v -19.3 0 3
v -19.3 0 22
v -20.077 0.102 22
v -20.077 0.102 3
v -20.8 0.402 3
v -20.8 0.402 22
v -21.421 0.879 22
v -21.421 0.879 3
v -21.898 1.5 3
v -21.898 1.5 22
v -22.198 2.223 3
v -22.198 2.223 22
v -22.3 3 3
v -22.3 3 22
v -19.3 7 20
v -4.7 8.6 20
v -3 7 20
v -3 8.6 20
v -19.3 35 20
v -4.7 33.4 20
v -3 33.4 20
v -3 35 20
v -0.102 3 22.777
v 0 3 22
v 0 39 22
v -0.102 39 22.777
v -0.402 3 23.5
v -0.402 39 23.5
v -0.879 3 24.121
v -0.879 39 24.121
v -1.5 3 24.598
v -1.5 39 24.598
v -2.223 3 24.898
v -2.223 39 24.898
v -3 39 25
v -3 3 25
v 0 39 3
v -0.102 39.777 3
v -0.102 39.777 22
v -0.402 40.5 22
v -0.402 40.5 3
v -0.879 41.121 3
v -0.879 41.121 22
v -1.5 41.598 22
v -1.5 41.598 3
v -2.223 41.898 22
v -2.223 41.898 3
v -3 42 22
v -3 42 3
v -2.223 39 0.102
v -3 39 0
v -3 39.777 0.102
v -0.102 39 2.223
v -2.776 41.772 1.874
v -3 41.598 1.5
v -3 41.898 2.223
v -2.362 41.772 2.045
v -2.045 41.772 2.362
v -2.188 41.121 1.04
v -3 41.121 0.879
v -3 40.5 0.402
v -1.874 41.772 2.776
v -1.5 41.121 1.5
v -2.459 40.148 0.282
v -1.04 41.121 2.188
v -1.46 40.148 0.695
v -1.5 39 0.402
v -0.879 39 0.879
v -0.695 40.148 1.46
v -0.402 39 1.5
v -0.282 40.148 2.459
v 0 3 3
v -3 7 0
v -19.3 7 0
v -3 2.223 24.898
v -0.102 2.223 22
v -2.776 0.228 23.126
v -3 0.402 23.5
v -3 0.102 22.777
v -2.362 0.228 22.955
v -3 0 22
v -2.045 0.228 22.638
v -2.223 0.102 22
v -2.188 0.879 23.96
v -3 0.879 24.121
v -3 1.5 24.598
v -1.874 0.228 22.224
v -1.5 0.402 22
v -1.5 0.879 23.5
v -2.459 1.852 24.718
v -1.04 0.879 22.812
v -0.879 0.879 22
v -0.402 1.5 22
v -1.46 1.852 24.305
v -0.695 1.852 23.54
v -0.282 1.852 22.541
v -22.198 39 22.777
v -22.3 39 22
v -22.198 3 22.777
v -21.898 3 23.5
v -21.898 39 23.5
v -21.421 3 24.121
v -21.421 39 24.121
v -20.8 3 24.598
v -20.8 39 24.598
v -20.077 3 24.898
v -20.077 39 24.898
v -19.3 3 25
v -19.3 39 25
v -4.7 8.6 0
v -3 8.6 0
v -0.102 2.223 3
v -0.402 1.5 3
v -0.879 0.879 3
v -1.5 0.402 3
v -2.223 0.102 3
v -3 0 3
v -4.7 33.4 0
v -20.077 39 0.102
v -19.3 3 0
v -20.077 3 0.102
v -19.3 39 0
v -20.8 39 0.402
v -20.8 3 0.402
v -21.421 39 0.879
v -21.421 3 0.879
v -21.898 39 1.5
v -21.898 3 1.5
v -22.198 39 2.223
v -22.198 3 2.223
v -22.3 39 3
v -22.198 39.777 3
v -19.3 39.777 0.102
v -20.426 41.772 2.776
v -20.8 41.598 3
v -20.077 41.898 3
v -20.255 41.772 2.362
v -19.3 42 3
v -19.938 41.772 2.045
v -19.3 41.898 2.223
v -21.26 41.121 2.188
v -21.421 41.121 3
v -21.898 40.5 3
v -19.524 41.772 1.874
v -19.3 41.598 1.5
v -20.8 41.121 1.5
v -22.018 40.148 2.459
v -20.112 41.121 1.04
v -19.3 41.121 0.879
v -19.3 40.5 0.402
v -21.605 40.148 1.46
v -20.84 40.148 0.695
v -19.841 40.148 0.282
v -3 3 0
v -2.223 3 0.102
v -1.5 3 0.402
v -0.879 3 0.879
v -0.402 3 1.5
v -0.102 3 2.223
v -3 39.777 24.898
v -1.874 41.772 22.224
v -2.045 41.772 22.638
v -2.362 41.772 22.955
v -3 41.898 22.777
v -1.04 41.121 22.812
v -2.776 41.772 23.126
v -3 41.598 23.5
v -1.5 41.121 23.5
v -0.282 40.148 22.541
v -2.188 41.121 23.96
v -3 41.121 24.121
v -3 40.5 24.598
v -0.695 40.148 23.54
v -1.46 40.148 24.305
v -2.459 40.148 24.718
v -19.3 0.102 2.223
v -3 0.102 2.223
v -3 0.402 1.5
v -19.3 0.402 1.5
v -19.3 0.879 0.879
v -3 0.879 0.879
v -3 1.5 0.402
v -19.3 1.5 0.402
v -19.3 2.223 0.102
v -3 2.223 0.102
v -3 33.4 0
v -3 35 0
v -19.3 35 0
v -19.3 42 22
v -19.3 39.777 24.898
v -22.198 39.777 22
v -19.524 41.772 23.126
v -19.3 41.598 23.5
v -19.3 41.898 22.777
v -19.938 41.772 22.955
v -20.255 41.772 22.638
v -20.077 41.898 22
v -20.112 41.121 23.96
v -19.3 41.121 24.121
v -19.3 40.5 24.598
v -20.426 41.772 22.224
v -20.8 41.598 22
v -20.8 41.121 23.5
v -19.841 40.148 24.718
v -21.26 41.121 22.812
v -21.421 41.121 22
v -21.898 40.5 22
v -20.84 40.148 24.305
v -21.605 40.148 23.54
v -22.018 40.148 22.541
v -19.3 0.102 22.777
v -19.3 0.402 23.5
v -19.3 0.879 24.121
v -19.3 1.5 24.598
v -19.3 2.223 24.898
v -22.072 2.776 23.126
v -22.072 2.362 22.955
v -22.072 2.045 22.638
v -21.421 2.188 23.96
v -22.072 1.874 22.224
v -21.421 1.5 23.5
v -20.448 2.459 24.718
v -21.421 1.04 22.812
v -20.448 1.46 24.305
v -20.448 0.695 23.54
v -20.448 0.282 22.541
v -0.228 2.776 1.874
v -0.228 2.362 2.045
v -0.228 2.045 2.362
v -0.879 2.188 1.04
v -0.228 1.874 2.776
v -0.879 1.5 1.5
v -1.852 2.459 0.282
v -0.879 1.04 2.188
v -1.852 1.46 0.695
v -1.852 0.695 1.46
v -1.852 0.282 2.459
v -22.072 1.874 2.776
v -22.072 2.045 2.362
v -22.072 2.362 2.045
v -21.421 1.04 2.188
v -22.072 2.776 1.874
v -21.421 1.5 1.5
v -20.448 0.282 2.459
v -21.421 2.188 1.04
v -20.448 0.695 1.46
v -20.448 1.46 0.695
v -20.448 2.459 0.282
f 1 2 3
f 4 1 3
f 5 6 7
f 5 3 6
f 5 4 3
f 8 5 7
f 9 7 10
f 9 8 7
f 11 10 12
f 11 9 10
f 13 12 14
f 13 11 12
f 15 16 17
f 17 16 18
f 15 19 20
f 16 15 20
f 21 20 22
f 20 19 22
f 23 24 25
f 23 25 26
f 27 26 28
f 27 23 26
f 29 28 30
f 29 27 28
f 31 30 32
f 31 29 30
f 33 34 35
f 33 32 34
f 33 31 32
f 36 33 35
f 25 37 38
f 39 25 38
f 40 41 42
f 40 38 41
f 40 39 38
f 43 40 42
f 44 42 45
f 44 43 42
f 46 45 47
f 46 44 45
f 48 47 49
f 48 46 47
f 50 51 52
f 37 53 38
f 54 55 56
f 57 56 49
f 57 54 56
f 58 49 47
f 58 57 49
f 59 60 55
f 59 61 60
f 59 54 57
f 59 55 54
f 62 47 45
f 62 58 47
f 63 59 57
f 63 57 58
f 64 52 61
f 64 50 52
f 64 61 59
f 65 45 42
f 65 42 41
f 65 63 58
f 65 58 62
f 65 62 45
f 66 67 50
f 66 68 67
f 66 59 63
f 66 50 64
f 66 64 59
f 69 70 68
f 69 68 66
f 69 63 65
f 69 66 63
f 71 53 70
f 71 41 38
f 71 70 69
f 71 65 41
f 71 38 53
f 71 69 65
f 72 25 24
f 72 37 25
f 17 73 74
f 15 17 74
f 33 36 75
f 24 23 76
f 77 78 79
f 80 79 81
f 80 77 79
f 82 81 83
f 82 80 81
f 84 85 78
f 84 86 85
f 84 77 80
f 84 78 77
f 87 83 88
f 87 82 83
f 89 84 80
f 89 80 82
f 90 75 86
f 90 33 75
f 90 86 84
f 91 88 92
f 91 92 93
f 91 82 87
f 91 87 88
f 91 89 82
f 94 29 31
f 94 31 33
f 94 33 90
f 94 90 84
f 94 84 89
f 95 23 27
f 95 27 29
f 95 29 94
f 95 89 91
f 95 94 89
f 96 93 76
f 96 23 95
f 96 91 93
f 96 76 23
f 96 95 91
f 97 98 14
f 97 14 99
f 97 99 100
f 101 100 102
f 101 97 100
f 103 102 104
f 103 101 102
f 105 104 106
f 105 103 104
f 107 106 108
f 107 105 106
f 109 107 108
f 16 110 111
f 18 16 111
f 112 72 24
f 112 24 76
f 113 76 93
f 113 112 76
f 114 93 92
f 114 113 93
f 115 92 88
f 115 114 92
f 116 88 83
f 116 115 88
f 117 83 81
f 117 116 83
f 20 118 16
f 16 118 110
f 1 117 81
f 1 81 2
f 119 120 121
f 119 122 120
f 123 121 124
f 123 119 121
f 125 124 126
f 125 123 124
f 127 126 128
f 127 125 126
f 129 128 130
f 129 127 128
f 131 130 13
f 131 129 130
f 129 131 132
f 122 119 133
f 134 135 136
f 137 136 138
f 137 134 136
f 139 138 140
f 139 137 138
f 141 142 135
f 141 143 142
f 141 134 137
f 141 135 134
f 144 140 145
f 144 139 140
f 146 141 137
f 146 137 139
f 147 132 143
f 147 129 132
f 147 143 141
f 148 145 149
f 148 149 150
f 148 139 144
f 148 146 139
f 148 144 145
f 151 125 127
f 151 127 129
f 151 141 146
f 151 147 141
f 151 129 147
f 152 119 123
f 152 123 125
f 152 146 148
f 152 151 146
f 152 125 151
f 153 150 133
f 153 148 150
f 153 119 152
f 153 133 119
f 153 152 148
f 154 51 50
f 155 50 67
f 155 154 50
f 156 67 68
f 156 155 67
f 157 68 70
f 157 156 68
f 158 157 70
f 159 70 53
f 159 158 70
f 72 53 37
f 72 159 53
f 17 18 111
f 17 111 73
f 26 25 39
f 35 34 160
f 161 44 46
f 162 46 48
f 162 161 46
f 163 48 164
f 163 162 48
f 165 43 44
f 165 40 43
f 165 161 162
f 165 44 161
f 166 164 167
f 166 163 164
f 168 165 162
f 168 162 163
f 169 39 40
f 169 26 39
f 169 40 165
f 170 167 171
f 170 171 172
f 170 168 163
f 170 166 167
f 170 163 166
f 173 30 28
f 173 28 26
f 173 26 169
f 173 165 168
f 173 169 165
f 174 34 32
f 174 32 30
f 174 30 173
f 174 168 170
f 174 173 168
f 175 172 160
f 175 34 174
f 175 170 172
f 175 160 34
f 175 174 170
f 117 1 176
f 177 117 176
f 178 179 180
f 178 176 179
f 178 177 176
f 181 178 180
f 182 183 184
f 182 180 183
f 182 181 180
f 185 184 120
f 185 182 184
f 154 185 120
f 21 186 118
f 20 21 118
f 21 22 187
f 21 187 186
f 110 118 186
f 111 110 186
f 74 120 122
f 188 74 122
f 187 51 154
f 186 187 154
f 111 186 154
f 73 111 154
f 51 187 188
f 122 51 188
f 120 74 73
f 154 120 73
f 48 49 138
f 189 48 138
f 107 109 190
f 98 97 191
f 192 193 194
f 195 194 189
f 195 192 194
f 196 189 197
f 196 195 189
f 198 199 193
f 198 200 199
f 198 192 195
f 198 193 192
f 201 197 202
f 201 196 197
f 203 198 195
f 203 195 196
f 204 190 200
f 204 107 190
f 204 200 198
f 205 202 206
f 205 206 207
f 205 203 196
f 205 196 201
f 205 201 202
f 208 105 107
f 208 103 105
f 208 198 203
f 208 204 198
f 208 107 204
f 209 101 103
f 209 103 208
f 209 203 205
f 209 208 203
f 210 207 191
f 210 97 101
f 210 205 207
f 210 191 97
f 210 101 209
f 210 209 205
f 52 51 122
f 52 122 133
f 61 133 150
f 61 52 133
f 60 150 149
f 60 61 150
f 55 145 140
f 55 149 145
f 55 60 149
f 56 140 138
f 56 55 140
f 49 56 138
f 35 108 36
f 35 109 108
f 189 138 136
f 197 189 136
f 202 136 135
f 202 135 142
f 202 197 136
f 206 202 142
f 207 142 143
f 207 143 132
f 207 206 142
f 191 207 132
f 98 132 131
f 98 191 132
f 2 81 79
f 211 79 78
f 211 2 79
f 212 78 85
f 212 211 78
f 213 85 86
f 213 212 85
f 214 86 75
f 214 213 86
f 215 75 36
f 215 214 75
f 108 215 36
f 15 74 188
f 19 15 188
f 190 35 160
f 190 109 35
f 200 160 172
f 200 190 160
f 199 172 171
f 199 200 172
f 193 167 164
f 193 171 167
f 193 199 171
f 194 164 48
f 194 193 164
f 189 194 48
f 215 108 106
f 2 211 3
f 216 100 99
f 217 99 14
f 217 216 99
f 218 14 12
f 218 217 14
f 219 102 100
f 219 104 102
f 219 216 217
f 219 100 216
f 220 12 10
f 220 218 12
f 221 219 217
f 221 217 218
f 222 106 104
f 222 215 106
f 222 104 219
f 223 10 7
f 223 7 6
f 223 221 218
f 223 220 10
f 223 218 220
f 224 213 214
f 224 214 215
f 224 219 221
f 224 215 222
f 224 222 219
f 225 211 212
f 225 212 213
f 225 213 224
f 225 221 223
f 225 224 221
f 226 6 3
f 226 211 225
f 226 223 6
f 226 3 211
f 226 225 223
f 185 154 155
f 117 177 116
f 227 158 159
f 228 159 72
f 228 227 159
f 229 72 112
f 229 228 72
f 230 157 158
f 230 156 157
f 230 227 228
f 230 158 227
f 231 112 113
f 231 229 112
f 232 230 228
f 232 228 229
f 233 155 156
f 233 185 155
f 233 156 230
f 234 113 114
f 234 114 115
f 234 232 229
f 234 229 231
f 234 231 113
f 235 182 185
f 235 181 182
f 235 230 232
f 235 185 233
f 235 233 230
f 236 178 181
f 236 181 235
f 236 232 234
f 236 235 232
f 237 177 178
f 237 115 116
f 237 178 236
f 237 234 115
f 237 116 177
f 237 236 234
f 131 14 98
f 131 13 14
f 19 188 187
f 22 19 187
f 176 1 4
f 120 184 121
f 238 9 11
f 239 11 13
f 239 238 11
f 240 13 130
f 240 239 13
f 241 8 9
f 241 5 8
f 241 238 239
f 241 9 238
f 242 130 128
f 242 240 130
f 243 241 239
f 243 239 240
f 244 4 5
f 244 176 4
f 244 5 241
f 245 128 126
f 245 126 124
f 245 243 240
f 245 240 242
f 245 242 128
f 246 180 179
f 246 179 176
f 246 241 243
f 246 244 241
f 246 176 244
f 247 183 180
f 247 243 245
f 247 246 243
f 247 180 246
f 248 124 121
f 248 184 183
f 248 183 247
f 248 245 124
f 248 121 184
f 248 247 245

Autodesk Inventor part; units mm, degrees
ref_plane "YZ Plane" through (0, 0, 0) normal (1, 0, 0) x (0, 1, 0)
ref_plane "XZ Plane" through (0, 0, 0) normal (0, 1, 0) x (-1, 0, 0)
ref_plane "XY Plane" through (0, 0, 0) normal (0, 0, 1) x (1, 0, 0)
sketch "Skizze1" plane through (0, 0, 0) normal (0, 0, 1) x (1, 0, 0)
  line L0 (0, 0) -> (-22.3, 0)
  line L1 (-22.3, 0) -> (-22.3, 42)
  line L2 (-22.3, 42) -> (0, 42)
  line L3 (0, 42) -> (0, 0)
  line L4 (-19.3, 35) -> (-3, 35)
  line L5 (-3, 35) -> (-3, 33.4)
  line L6 (-3, 33.4) -> (-4.7, 33.4)
  line L7 (-4.7, 8.6) -> (-3, 8.6)
  line L8 (-3, 8.6) -> (-3, 7)
  line L9 (-3, 7) -> (-19.3, 7)
  line L10 (-19.3, 7) -> (-19.3, 35)
  line L11 (-4.7, 33.4) -> (-4.7, 8.6)
  line L12 (-11.15, 7) -> (-11.15, 0)
  line L13 (-11.15, 35) -> (-11.15, 42)
  dimension "d1" = 42
  dimension "d2" = 16.3
  dimension "d3" = 1.6
  dimension "d6" = 1.6
  dimension "d7" = 28
  dimension "d8" = 1.7
  dimension "d10" = 3
  dimension "d17" = 16.3
  dimension "d19" = 3
extrude "Extrusion1" add sketch "Skizze1" along normal blind 20 contours L0 L12 L9 L8 L7 L11 L6 L5 L4 L13 L2 L3 | L0 L1 L2 L13 L4 L10 L9 L12
sketch "Skizze2" plane through (0, 0, 20) normal (0, 0, 1) x (1, 0, 0)
  line L0 (0, 42) -> (-22.3, 42) projected
  line L1 (-22.3, 42) -> (0, 42)
  line L2 (0, 42) -> (0, 0)
  line L3 (0, 0) -> (-22.3, 0)
  line L4 (-22.3, 0) -> (-22.3, 42)
extrude "Extrusion2" add sketch "Skizze2" along normal blind 5
fillet "Rundung1" radius 3 12 edges at (-11.15, 0, 0) (-22.3, 21, 0) (0, 21, 0) (-11.15, 42, 0) (0, 21, 25) (0, 0, 12.5) (-11.15, 0, 25) (-22.3, 0, 12.5) (-22.3, 21, 25) (-11.15, 42, 25) (0, 42, 12.5) (-22.3, 42, 12.5)
properties part number "7.3 Endhalterung Schiene"
